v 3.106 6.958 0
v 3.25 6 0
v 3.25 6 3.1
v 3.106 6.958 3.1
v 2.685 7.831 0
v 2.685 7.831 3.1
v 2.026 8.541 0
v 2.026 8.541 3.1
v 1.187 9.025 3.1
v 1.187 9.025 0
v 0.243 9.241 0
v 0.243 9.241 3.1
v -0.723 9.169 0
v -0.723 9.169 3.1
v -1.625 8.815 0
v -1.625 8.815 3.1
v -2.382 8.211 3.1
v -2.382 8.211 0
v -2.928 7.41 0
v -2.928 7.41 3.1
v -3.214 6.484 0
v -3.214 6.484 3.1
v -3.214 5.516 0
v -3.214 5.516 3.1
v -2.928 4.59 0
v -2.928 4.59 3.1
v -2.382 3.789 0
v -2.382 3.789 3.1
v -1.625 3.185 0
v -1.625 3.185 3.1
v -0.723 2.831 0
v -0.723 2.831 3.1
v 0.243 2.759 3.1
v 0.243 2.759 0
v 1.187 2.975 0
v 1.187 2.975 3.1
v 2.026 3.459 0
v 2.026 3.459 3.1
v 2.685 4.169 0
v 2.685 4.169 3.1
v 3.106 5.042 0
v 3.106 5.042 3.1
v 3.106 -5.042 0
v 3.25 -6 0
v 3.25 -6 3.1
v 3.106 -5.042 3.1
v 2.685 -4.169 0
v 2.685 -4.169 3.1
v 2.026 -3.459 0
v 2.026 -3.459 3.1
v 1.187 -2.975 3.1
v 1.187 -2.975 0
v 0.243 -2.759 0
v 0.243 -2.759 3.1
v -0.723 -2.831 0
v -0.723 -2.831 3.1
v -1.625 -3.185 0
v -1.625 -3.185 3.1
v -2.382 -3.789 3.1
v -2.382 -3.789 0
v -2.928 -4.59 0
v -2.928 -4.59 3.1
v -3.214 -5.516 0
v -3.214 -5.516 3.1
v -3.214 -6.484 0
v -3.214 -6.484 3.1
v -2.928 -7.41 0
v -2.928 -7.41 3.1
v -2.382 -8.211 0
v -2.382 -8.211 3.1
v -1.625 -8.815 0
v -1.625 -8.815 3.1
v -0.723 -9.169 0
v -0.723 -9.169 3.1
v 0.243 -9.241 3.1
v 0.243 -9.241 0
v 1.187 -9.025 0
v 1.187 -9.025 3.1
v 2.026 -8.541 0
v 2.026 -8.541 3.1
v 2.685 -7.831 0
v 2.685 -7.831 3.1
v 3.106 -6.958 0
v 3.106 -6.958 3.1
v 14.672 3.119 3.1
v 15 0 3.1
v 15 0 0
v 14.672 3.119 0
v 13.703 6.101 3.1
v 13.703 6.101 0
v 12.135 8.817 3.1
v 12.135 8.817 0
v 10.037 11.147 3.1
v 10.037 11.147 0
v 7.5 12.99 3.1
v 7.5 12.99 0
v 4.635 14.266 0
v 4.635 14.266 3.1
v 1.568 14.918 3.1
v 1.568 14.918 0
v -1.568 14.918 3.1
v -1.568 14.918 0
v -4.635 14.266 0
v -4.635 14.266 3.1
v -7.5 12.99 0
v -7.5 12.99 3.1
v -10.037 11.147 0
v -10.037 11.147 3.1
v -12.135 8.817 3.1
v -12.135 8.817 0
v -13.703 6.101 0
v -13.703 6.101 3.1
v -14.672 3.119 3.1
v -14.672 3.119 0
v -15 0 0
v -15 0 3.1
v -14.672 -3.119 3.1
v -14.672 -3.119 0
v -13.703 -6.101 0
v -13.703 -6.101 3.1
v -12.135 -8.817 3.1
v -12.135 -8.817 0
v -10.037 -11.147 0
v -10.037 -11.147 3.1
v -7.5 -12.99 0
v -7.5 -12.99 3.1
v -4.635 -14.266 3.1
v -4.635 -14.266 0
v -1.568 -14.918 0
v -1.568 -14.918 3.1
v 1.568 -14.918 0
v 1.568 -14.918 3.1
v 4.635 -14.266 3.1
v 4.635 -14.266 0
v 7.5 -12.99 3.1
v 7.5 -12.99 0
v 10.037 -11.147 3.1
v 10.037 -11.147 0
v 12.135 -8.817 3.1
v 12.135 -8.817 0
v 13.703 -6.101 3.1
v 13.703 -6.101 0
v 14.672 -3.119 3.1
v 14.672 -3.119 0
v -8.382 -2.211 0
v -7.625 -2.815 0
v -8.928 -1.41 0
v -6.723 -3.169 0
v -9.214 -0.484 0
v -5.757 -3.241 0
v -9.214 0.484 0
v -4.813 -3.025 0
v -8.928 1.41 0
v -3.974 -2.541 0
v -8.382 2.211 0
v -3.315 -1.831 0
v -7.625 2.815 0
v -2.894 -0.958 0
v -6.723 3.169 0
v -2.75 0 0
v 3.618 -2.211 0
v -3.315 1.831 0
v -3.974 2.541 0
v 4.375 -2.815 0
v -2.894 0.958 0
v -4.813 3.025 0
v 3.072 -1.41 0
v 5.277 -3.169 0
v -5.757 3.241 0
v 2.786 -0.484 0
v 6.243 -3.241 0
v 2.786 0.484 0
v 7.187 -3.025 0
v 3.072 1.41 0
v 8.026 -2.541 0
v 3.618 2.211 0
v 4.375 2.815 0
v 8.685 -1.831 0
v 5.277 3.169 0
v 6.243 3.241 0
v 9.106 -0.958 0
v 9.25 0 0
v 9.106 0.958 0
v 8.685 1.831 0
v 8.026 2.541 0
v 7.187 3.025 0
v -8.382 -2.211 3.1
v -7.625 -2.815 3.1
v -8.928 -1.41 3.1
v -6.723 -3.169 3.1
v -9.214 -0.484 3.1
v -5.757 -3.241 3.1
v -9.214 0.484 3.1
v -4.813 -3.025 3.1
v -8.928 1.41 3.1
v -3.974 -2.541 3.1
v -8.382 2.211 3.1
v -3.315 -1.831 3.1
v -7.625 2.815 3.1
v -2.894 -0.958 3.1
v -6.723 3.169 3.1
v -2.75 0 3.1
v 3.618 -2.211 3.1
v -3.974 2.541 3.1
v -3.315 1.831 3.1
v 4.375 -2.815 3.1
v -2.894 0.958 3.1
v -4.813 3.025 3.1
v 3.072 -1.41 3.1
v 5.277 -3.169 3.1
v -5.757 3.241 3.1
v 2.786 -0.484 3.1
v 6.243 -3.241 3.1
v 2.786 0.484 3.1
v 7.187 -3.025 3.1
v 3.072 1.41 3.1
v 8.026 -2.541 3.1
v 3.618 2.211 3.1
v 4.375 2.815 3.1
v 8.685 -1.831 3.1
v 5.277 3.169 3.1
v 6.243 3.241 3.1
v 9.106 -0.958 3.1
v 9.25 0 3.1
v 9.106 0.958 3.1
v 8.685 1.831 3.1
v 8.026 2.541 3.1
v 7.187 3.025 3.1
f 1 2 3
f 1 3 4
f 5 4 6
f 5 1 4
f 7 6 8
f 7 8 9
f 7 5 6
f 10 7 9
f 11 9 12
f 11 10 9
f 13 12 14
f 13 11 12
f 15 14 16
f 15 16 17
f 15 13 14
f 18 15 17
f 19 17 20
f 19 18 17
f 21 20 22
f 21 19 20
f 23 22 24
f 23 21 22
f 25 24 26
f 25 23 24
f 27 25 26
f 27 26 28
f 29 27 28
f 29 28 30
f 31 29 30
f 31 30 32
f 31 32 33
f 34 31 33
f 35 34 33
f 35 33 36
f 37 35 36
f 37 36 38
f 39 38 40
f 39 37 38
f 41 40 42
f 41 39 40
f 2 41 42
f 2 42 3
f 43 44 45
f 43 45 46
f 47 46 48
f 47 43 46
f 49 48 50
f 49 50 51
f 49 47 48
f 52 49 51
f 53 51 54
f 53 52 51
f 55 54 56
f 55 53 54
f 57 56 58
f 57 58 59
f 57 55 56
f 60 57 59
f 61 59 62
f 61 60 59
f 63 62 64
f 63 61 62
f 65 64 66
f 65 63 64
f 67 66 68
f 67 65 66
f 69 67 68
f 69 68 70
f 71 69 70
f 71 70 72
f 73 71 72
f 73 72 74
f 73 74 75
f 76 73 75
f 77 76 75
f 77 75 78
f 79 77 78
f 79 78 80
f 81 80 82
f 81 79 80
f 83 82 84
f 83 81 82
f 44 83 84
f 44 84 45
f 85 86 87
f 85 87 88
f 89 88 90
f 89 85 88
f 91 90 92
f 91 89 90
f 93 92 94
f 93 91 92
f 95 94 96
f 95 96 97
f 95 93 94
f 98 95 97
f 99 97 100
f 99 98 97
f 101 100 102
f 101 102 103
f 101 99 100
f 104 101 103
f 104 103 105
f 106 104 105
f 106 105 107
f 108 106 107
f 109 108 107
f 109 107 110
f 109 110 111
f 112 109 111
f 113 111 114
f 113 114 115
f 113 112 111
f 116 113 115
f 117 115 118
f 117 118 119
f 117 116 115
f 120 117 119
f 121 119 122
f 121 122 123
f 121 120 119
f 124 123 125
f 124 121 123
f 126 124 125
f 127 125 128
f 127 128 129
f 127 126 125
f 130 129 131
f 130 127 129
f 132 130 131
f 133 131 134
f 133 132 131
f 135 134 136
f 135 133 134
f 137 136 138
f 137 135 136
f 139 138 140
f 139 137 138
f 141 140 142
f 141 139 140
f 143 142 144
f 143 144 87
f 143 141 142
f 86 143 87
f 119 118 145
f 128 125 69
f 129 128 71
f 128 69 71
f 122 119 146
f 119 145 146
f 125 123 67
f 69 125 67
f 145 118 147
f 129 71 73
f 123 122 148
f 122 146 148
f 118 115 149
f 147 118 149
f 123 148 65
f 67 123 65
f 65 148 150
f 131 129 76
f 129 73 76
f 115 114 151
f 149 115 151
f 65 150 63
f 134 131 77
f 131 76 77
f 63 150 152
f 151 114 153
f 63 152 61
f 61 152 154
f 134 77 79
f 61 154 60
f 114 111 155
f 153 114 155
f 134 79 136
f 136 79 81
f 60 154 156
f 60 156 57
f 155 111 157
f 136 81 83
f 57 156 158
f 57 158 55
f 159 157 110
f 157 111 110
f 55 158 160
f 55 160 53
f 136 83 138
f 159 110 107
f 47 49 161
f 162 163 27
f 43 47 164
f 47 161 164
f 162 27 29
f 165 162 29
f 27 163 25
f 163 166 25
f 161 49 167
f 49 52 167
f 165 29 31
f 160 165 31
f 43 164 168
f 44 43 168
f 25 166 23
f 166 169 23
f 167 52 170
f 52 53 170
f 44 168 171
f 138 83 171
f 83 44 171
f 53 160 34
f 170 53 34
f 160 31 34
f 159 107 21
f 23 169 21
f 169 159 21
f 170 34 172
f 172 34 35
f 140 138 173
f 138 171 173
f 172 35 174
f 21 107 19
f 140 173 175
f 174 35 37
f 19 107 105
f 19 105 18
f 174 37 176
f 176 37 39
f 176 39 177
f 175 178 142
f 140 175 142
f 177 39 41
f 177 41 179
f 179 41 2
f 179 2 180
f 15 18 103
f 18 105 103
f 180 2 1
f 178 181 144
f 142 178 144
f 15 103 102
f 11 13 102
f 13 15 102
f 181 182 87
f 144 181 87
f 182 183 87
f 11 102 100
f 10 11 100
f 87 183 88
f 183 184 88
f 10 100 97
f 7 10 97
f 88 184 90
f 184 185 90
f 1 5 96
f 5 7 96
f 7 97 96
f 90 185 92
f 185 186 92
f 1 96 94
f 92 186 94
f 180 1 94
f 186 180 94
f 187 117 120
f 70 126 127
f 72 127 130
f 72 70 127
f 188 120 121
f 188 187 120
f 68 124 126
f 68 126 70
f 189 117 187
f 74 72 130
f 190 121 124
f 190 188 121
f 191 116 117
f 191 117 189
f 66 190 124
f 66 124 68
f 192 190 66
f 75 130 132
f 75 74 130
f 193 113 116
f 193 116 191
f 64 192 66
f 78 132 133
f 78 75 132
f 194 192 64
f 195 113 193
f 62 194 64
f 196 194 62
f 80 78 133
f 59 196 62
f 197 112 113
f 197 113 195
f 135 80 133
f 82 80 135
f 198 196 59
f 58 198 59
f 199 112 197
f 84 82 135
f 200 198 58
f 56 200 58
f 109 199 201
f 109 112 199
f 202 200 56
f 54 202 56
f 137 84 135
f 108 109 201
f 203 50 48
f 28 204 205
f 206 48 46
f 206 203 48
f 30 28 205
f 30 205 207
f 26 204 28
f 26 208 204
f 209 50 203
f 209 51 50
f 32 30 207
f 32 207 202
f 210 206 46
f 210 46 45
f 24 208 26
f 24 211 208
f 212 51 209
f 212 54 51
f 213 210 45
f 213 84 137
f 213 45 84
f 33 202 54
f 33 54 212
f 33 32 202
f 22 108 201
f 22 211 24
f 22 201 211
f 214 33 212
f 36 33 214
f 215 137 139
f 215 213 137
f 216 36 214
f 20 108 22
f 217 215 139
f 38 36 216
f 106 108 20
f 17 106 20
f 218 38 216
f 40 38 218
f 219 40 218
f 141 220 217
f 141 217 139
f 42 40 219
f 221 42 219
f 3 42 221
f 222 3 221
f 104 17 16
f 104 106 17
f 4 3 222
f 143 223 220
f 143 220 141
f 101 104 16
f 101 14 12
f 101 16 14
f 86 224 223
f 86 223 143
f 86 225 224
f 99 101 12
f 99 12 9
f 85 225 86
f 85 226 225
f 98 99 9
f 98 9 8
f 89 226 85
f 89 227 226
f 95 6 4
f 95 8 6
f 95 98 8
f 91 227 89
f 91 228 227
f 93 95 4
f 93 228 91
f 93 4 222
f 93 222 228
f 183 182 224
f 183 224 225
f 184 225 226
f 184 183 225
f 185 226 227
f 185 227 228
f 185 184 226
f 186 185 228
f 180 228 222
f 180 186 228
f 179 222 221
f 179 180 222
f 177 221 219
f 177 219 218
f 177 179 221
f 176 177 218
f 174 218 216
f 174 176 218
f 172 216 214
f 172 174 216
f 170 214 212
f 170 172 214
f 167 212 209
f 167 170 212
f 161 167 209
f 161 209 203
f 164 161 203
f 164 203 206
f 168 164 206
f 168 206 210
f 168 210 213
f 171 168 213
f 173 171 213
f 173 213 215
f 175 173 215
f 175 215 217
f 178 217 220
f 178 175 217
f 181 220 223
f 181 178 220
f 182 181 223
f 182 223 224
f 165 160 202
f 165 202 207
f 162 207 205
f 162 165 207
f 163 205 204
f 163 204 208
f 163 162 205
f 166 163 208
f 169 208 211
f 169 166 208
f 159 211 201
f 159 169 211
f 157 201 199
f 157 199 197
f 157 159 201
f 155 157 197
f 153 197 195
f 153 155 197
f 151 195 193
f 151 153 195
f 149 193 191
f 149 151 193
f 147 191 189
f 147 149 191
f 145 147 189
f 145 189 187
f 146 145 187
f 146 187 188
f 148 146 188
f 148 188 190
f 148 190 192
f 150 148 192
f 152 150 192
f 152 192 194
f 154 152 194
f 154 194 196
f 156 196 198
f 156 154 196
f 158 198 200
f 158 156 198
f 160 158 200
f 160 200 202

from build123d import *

# Parameters (mm, degrees)
SKETCH1_R           = 12.7
SKETCH1_R_2         = 3.25
BOSS_EXTRUDE1_DEPTH = 3.1
SKETCH2_R           = 15
SKETCH2_R_2         = 12.7
BOSS_EXTRUDE2_DEPTH = 3.1


with BuildPart() as part:
    # Sketch1 → Boss-Extrude1 (new body)
    with BuildSketch(Plane.XY):
        Circle(SKETCH1_R)
        with Locations((-6, 0)):
            Circle(SKETCH1_R_2, mode=Mode.SUBTRACT)
        with Locations((0, 6)):
            Circle(SKETCH1_R_2, mode=Mode.SUBTRACT)
        with Locations((6, 0)):
            Circle(SKETCH1_R_2, mode=Mode.SUBTRACT)
        with Locations((0, -6)):
            Circle(SKETCH1_R_2, mode=Mode.SUBTRACT)
    extrude(amount=BOSS_EXTRUDE1_DEPTH)

    # Sketch2 → Boss-Extrude2 (add, through all)
    with BuildSketch(Plane.XY.offset(3.1)):
        Circle(SKETCH2_R)
        Circle(SKETCH2_R_2, mode=Mode.SUBTRACT)
    extrude(amount=-BOSS_EXTRUDE2_DEPTH)


solid = part.part
